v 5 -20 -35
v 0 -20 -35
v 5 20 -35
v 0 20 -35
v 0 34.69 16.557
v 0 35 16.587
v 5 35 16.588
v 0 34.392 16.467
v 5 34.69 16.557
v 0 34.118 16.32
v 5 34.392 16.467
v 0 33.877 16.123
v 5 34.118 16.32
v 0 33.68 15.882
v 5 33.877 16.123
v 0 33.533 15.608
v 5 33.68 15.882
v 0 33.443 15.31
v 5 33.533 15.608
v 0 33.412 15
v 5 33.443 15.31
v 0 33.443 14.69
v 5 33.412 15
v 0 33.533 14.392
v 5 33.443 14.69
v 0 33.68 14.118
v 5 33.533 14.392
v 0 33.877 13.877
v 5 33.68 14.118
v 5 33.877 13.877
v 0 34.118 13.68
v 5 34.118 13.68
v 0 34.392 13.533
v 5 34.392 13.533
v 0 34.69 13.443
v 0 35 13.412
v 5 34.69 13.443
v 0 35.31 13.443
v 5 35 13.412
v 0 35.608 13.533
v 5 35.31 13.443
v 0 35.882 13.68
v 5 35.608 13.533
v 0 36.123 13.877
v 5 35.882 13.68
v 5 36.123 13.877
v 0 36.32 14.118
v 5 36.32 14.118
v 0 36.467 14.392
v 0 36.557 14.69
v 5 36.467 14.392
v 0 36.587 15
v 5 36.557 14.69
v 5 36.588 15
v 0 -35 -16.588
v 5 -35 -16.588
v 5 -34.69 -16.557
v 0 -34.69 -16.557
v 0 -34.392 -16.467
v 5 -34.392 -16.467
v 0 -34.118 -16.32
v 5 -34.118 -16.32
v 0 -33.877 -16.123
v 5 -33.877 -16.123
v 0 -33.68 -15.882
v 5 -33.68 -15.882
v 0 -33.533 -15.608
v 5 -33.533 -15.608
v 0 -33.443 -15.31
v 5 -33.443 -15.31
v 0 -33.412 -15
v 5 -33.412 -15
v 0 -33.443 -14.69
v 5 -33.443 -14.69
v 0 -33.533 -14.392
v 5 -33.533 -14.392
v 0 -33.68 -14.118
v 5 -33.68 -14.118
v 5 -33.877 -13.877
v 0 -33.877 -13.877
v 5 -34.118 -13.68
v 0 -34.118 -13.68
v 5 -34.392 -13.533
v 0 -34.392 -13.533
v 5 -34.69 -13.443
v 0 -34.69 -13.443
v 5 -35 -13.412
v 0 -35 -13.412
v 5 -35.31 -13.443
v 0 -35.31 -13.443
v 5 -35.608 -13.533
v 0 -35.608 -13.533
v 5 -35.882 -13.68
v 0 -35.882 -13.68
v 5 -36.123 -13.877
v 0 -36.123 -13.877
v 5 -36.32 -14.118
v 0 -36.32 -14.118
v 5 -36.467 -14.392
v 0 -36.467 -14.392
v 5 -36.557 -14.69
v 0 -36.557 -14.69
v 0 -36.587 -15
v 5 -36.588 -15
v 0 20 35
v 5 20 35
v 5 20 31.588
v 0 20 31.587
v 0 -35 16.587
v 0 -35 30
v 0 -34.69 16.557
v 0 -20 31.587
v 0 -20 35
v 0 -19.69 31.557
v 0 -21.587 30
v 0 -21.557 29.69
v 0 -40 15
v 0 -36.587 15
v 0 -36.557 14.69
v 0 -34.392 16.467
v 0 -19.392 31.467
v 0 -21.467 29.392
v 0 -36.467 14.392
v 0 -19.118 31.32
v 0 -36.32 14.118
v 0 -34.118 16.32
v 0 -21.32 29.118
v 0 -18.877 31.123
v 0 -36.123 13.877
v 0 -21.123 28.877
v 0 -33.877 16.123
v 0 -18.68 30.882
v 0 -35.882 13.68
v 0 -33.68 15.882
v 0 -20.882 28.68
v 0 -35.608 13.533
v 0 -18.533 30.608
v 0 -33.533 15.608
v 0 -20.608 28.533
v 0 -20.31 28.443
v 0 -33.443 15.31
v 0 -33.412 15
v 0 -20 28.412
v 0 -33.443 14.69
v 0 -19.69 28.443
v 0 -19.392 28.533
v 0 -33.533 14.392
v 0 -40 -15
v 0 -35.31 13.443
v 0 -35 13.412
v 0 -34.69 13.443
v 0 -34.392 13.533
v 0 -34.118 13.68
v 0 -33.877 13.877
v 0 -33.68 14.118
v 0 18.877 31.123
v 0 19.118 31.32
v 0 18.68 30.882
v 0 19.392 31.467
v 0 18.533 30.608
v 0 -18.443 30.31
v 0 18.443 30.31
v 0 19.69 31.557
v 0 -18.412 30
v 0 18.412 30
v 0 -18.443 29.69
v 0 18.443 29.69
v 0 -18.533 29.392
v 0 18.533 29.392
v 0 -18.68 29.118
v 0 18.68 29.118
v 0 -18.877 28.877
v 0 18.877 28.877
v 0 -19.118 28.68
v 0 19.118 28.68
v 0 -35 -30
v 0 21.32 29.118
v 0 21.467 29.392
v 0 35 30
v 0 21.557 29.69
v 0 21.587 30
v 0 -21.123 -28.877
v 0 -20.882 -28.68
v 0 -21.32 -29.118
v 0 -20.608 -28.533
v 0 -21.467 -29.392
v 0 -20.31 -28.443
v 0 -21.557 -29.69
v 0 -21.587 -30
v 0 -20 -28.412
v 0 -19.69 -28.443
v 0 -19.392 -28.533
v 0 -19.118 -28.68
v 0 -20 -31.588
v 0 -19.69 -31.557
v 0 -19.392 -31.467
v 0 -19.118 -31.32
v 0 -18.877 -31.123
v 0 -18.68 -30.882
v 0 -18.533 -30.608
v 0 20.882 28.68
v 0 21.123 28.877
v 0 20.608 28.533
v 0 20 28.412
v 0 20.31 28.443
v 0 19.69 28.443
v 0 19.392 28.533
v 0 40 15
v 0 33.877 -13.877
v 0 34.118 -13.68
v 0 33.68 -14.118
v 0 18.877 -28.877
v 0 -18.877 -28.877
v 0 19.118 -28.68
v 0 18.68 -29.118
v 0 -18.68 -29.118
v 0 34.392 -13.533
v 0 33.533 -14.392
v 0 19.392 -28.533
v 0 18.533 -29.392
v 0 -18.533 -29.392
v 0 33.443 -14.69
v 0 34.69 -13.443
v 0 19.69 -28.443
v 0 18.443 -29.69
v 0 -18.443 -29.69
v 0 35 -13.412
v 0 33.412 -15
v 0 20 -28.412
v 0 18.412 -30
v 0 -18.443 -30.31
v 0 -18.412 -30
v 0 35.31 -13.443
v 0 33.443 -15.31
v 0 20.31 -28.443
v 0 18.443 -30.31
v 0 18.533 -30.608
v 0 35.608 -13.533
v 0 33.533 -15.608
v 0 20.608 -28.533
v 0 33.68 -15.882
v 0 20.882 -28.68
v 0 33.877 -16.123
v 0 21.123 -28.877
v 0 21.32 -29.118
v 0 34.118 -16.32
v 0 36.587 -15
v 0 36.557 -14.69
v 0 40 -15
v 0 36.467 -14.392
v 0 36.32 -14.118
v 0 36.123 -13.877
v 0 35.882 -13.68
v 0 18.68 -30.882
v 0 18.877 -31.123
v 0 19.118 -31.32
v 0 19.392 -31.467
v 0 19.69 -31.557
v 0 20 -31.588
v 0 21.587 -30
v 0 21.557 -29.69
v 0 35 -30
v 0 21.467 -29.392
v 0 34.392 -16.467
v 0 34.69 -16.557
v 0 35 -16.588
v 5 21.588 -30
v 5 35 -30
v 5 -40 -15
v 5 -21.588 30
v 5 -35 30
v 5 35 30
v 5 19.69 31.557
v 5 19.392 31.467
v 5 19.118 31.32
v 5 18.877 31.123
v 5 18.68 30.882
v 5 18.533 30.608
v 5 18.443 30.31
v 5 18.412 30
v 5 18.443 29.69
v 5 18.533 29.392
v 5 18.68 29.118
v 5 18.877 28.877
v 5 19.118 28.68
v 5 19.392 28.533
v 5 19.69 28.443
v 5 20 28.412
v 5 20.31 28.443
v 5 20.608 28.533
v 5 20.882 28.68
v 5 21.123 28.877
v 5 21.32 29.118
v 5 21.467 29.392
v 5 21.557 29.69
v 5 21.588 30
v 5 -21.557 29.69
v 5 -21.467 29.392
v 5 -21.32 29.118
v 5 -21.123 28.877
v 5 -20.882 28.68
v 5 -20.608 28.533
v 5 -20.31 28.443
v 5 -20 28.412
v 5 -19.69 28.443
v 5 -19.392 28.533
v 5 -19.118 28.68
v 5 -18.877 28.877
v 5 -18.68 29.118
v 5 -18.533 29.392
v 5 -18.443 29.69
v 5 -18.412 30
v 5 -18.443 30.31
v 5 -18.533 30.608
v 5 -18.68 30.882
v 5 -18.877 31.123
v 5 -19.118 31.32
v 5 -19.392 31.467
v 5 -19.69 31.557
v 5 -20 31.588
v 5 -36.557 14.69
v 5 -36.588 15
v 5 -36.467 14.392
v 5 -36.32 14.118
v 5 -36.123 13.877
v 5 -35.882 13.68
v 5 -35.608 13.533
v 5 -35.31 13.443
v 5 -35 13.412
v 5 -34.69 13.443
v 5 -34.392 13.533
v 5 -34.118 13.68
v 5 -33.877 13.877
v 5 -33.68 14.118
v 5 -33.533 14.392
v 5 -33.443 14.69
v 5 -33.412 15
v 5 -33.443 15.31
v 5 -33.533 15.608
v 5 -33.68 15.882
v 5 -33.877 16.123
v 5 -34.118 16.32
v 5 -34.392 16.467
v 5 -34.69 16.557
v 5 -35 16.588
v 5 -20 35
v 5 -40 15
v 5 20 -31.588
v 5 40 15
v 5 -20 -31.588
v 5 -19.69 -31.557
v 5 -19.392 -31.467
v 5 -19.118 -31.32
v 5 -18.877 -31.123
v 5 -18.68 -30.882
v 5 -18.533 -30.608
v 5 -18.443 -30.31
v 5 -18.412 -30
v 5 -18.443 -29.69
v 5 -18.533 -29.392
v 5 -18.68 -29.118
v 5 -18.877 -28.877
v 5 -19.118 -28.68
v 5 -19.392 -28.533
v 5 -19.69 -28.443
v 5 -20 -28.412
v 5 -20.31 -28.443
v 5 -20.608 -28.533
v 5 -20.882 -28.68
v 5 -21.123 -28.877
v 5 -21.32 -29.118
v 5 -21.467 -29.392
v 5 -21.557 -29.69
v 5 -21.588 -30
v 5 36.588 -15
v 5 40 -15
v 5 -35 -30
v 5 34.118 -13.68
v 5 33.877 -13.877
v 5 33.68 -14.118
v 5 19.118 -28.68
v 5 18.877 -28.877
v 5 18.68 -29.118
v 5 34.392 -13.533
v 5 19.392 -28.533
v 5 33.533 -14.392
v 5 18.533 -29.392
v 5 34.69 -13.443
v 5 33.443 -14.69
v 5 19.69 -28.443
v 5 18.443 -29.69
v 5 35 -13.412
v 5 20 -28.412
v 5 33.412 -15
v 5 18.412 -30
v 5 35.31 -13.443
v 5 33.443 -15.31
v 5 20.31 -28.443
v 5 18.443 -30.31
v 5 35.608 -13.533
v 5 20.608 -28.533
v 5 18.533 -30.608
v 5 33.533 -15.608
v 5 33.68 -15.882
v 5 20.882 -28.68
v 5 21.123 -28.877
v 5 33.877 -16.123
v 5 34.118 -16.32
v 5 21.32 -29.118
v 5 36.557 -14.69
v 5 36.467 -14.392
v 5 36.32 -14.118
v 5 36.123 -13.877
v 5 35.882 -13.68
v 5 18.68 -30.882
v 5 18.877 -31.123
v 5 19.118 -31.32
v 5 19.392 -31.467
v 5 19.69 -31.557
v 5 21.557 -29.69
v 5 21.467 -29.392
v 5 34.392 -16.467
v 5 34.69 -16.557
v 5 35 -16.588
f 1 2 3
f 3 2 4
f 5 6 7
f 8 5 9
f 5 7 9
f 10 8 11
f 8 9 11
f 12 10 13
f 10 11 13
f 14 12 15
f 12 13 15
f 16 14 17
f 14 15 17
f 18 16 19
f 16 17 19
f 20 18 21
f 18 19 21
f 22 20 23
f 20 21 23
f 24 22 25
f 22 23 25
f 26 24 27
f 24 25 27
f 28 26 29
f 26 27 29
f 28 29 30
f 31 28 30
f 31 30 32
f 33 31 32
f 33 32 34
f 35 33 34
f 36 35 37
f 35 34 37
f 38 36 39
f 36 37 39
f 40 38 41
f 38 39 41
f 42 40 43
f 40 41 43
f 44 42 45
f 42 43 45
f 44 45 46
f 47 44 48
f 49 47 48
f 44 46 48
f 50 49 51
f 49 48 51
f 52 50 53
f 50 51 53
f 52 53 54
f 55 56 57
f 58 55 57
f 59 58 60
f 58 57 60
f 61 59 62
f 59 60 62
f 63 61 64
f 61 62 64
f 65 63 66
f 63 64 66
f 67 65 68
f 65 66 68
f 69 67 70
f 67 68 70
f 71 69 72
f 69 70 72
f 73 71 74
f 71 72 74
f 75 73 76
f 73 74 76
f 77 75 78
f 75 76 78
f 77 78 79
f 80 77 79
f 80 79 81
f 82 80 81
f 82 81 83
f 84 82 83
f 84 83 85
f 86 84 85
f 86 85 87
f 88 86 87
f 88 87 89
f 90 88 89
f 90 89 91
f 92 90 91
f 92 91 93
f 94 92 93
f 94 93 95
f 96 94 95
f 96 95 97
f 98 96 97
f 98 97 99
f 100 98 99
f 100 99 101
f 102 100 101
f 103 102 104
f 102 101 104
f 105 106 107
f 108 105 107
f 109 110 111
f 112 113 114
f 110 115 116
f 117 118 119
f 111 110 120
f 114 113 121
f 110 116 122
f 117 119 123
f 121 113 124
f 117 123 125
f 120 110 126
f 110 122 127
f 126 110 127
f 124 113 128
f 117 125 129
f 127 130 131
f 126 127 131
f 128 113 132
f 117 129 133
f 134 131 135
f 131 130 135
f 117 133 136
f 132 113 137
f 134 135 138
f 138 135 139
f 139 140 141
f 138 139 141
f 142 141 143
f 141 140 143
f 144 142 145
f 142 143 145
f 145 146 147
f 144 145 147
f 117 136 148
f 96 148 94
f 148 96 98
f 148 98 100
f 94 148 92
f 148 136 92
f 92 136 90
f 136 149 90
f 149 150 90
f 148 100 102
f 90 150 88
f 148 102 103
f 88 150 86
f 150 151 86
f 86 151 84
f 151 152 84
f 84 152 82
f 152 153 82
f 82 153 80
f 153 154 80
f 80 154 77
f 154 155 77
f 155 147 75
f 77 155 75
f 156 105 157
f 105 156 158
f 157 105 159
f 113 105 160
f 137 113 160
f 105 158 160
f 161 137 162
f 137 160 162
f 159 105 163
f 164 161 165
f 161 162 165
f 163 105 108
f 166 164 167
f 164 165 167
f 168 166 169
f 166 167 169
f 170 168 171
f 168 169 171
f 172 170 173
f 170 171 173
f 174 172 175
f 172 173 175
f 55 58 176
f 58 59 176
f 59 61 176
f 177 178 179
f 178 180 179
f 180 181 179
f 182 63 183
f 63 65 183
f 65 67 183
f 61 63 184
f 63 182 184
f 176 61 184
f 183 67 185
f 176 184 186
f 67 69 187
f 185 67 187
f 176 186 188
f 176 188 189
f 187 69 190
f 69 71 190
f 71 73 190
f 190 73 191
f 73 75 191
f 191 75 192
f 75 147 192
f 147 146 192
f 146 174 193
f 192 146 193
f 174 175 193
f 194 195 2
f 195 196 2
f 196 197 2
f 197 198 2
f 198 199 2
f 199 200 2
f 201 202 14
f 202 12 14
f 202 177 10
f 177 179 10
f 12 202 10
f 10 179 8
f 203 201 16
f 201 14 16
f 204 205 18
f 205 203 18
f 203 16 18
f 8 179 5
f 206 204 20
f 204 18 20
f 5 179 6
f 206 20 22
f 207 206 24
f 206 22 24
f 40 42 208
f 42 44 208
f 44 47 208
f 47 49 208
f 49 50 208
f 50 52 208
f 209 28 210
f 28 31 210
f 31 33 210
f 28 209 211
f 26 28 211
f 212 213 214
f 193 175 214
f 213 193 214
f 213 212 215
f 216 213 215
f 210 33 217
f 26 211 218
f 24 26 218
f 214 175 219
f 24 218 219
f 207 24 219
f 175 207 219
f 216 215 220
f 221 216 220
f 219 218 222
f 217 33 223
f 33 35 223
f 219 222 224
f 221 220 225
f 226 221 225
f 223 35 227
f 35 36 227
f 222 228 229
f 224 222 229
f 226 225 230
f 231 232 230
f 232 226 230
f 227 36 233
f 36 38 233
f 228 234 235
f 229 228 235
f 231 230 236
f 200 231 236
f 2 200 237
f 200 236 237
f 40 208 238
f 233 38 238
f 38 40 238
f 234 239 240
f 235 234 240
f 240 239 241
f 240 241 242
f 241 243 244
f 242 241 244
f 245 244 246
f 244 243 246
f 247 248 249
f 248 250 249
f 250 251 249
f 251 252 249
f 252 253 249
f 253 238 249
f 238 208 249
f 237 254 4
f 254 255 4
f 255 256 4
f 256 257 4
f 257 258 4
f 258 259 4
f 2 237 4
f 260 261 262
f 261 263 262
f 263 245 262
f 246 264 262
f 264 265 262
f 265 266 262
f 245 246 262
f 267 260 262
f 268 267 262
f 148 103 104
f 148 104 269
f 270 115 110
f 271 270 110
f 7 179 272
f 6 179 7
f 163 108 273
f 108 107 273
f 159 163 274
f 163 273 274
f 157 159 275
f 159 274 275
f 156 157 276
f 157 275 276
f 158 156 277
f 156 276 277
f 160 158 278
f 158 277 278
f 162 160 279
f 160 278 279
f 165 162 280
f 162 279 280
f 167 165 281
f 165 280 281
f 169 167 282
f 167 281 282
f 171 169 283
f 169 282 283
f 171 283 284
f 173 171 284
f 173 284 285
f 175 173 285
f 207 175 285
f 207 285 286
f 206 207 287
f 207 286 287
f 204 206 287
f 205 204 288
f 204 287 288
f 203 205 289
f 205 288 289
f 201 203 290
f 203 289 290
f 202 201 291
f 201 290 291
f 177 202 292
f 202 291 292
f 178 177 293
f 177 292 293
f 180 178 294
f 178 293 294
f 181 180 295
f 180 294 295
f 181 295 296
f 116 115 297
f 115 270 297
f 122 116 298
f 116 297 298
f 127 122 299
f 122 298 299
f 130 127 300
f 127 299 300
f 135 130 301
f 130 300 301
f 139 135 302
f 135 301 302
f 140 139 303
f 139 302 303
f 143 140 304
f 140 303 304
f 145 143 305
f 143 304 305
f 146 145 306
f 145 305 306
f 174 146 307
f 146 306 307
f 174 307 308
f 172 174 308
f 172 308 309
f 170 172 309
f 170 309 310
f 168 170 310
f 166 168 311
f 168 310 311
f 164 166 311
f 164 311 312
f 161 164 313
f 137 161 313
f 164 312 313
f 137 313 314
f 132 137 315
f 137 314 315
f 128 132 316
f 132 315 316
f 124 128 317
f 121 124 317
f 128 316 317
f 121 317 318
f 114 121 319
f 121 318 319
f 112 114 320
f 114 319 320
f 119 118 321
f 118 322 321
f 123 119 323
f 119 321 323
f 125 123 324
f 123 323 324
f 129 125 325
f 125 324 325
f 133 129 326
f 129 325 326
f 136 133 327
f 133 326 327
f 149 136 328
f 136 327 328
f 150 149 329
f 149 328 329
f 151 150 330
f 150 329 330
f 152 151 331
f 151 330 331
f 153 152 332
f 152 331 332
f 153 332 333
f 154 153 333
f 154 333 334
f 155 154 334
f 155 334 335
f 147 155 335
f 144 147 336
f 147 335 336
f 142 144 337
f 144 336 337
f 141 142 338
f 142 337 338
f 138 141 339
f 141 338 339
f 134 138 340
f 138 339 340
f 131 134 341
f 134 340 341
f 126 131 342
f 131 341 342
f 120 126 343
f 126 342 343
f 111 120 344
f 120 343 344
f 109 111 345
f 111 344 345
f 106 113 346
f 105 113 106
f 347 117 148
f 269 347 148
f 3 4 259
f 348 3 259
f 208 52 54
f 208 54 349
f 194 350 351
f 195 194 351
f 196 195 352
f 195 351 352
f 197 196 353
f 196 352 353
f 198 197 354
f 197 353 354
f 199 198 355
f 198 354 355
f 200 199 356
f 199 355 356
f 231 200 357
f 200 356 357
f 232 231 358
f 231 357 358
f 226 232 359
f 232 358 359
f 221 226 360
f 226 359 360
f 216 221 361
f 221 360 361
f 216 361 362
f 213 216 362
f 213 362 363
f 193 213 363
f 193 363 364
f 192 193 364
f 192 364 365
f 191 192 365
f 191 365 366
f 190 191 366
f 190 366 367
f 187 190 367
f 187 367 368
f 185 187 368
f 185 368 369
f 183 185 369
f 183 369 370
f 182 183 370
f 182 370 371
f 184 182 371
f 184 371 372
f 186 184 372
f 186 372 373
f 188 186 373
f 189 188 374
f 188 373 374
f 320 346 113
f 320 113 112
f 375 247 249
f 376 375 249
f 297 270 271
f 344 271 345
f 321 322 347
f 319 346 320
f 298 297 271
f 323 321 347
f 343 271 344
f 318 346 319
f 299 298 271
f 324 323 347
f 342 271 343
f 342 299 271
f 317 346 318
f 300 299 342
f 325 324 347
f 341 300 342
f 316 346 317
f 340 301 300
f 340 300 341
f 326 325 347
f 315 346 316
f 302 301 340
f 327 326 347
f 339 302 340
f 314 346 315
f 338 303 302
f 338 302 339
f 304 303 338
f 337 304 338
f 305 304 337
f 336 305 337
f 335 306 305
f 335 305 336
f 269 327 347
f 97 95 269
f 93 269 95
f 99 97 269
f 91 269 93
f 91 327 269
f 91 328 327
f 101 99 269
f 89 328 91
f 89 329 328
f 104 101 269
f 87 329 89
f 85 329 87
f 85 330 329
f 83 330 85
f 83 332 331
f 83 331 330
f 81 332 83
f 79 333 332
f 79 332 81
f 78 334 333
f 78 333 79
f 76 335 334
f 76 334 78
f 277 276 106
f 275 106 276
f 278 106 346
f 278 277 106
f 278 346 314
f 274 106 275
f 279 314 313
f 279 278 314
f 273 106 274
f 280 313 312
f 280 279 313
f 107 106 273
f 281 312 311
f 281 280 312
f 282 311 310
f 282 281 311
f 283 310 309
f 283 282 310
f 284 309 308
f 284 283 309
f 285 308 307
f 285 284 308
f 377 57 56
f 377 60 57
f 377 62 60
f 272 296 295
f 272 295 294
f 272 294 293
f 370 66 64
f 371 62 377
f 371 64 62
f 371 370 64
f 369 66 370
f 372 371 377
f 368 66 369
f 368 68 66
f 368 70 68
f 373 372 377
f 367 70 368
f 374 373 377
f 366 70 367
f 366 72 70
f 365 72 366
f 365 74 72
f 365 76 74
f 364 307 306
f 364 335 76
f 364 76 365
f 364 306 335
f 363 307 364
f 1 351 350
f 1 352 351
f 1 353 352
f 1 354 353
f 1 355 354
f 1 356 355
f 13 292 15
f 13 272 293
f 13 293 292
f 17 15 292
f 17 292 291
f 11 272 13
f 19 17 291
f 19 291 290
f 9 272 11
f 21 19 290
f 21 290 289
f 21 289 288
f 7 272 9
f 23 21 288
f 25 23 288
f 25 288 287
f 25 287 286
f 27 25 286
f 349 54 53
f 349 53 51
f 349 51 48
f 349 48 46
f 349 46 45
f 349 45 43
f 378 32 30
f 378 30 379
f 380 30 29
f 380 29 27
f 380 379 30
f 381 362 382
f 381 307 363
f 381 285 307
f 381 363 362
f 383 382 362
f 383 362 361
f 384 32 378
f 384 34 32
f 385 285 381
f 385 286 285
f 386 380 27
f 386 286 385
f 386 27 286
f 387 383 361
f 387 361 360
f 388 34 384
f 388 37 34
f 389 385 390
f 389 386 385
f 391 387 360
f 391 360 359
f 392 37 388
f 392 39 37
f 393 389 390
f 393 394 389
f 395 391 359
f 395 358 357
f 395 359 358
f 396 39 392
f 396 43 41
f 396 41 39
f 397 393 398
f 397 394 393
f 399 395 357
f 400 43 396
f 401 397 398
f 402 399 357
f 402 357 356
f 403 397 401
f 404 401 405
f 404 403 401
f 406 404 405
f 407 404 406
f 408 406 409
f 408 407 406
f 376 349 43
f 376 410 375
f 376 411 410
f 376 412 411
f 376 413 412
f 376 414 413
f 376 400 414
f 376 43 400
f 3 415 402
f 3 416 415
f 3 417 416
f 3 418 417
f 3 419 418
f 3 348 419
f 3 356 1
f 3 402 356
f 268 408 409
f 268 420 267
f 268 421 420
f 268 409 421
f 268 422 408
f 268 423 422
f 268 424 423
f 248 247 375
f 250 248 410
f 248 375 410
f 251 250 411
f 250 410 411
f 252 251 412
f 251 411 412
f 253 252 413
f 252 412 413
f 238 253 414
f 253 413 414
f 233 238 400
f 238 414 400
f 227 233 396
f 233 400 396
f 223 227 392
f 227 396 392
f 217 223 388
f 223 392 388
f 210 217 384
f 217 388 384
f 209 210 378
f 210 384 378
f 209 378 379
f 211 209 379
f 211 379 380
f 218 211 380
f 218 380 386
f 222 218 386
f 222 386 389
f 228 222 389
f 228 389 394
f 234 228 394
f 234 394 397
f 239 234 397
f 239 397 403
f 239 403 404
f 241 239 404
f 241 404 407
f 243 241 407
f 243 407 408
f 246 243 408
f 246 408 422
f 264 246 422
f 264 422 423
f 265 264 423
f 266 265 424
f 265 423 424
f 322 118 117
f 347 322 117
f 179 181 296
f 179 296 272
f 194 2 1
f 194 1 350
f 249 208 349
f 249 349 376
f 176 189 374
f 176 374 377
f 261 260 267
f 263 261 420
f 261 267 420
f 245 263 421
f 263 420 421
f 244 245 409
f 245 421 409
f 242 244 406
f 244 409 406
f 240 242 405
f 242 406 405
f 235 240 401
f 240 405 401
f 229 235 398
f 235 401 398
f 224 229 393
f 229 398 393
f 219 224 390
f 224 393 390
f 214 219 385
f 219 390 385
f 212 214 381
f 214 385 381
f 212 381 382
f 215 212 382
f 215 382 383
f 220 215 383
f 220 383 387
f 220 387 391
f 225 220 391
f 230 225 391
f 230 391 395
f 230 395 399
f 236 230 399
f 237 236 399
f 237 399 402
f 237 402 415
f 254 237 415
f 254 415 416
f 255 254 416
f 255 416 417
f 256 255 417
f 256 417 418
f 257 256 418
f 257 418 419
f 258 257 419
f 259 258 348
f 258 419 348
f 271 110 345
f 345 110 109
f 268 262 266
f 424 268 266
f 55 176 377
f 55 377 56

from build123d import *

# Parameters (mm, degrees)
SKETCH1_W                                = 70
SKETCH1_H                                = 80
BOSS_EXTRUDE1_DEPTH                      = 5
CUT_EXTRUDE1_START                       = -6
CUT_EXTRUDE1_DEPTH                       = 7
MIRROR1_START                            = -6
MIRROR1_AT_THE_SECOND_PLANE_COPY_1_DEPTH = 7
SKETCH4_R                                = 1.5875
CUT_EXTRUDE2_DEPTH                       = 6


with BuildPart() as part:
    # Sketch1 → Boss-Extrude1 (new body)
    with BuildSketch(Plane(origin=(0, 0, 0), x_dir=(0, 0, -1), z_dir=(1, 0, 0))):
        Rectangle(SKETCH1_W, SKETCH1_H)
    extrude(amount=BOSS_EXTRUDE1_DEPTH)

    # Sketch3 → Cut-Extrude1 (cut)
    with BuildSketch(Plane(origin=(5, 0, 0), x_dir=(0, 0, -1), z_dir=(1, 0, 0)).offset(CUT_EXTRUDE1_START)):
        Polygon((-35, 20), (-30, 20), (-30, 35), (-15, 35), (-15, 40), (-35, 40), align=None)
    cut_extrude1 = extrude(amount=CUT_EXTRUDE1_DEPTH, mode=Mode.SUBTRACT)

    # Mirror1: Cut-Extrude1 across plane
    add(cut_extrude1.mirror(Plane.XY), mode=Mode.SUBTRACT)

    # Mirror1 at the second plane: Cut-Extrude1 across plane
    add(cut_extrude1.mirror(Plane.ZX), mode=Mode.SUBTRACT)

    # Mirror1 at the second plane copy 1 sketc → Mirror1 at the second plane copy 1 (cut)
    with BuildSketch(Plane(origin=(5, 0, 0), x_dir=(0, 0, 1), z_dir=(1, 0, 0)).offset(MIRROR1_START)):
        Polygon((-35, 20), (-30, 20), (-30, 35), (-15, 35), (-15, 40), (-35, 40), align=None)
    extrude(amount=MIRROR1_AT_THE_SECOND_PLANE_COPY_1_DEPTH, mode=Mode.SUBTRACT)

    # Sketch4 → Cut-Extrude2 (cut, through all)
    with BuildSketch(Plane(origin=(5, 0, 0), x_dir=(0, 0, -1), z_dir=(1, 0, 0))):
        with Locations((-30, 20)):
            Circle(SKETCH4_R)
        with Locations((-15, 35)):
            Circle(SKETCH4_R)
        with Locations((15, 35)):
            Circle(SKETCH4_R)
        with Locations((30, 20)):
            Circle(SKETCH4_R)
        with Locations((30, -20)):
            Circle(SKETCH4_R)
        with Locations((15, -35)):
            Circle(SKETCH4_R)
        with Locations((-15, -35)):
            Circle(SKETCH4_R)
        with Locations((-30, -20)):
            Circle(SKETCH4_R)
    extrude(amount=-CUT_EXTRUDE2_DEPTH, mode=Mode.SUBTRACT)


solid = part.part
